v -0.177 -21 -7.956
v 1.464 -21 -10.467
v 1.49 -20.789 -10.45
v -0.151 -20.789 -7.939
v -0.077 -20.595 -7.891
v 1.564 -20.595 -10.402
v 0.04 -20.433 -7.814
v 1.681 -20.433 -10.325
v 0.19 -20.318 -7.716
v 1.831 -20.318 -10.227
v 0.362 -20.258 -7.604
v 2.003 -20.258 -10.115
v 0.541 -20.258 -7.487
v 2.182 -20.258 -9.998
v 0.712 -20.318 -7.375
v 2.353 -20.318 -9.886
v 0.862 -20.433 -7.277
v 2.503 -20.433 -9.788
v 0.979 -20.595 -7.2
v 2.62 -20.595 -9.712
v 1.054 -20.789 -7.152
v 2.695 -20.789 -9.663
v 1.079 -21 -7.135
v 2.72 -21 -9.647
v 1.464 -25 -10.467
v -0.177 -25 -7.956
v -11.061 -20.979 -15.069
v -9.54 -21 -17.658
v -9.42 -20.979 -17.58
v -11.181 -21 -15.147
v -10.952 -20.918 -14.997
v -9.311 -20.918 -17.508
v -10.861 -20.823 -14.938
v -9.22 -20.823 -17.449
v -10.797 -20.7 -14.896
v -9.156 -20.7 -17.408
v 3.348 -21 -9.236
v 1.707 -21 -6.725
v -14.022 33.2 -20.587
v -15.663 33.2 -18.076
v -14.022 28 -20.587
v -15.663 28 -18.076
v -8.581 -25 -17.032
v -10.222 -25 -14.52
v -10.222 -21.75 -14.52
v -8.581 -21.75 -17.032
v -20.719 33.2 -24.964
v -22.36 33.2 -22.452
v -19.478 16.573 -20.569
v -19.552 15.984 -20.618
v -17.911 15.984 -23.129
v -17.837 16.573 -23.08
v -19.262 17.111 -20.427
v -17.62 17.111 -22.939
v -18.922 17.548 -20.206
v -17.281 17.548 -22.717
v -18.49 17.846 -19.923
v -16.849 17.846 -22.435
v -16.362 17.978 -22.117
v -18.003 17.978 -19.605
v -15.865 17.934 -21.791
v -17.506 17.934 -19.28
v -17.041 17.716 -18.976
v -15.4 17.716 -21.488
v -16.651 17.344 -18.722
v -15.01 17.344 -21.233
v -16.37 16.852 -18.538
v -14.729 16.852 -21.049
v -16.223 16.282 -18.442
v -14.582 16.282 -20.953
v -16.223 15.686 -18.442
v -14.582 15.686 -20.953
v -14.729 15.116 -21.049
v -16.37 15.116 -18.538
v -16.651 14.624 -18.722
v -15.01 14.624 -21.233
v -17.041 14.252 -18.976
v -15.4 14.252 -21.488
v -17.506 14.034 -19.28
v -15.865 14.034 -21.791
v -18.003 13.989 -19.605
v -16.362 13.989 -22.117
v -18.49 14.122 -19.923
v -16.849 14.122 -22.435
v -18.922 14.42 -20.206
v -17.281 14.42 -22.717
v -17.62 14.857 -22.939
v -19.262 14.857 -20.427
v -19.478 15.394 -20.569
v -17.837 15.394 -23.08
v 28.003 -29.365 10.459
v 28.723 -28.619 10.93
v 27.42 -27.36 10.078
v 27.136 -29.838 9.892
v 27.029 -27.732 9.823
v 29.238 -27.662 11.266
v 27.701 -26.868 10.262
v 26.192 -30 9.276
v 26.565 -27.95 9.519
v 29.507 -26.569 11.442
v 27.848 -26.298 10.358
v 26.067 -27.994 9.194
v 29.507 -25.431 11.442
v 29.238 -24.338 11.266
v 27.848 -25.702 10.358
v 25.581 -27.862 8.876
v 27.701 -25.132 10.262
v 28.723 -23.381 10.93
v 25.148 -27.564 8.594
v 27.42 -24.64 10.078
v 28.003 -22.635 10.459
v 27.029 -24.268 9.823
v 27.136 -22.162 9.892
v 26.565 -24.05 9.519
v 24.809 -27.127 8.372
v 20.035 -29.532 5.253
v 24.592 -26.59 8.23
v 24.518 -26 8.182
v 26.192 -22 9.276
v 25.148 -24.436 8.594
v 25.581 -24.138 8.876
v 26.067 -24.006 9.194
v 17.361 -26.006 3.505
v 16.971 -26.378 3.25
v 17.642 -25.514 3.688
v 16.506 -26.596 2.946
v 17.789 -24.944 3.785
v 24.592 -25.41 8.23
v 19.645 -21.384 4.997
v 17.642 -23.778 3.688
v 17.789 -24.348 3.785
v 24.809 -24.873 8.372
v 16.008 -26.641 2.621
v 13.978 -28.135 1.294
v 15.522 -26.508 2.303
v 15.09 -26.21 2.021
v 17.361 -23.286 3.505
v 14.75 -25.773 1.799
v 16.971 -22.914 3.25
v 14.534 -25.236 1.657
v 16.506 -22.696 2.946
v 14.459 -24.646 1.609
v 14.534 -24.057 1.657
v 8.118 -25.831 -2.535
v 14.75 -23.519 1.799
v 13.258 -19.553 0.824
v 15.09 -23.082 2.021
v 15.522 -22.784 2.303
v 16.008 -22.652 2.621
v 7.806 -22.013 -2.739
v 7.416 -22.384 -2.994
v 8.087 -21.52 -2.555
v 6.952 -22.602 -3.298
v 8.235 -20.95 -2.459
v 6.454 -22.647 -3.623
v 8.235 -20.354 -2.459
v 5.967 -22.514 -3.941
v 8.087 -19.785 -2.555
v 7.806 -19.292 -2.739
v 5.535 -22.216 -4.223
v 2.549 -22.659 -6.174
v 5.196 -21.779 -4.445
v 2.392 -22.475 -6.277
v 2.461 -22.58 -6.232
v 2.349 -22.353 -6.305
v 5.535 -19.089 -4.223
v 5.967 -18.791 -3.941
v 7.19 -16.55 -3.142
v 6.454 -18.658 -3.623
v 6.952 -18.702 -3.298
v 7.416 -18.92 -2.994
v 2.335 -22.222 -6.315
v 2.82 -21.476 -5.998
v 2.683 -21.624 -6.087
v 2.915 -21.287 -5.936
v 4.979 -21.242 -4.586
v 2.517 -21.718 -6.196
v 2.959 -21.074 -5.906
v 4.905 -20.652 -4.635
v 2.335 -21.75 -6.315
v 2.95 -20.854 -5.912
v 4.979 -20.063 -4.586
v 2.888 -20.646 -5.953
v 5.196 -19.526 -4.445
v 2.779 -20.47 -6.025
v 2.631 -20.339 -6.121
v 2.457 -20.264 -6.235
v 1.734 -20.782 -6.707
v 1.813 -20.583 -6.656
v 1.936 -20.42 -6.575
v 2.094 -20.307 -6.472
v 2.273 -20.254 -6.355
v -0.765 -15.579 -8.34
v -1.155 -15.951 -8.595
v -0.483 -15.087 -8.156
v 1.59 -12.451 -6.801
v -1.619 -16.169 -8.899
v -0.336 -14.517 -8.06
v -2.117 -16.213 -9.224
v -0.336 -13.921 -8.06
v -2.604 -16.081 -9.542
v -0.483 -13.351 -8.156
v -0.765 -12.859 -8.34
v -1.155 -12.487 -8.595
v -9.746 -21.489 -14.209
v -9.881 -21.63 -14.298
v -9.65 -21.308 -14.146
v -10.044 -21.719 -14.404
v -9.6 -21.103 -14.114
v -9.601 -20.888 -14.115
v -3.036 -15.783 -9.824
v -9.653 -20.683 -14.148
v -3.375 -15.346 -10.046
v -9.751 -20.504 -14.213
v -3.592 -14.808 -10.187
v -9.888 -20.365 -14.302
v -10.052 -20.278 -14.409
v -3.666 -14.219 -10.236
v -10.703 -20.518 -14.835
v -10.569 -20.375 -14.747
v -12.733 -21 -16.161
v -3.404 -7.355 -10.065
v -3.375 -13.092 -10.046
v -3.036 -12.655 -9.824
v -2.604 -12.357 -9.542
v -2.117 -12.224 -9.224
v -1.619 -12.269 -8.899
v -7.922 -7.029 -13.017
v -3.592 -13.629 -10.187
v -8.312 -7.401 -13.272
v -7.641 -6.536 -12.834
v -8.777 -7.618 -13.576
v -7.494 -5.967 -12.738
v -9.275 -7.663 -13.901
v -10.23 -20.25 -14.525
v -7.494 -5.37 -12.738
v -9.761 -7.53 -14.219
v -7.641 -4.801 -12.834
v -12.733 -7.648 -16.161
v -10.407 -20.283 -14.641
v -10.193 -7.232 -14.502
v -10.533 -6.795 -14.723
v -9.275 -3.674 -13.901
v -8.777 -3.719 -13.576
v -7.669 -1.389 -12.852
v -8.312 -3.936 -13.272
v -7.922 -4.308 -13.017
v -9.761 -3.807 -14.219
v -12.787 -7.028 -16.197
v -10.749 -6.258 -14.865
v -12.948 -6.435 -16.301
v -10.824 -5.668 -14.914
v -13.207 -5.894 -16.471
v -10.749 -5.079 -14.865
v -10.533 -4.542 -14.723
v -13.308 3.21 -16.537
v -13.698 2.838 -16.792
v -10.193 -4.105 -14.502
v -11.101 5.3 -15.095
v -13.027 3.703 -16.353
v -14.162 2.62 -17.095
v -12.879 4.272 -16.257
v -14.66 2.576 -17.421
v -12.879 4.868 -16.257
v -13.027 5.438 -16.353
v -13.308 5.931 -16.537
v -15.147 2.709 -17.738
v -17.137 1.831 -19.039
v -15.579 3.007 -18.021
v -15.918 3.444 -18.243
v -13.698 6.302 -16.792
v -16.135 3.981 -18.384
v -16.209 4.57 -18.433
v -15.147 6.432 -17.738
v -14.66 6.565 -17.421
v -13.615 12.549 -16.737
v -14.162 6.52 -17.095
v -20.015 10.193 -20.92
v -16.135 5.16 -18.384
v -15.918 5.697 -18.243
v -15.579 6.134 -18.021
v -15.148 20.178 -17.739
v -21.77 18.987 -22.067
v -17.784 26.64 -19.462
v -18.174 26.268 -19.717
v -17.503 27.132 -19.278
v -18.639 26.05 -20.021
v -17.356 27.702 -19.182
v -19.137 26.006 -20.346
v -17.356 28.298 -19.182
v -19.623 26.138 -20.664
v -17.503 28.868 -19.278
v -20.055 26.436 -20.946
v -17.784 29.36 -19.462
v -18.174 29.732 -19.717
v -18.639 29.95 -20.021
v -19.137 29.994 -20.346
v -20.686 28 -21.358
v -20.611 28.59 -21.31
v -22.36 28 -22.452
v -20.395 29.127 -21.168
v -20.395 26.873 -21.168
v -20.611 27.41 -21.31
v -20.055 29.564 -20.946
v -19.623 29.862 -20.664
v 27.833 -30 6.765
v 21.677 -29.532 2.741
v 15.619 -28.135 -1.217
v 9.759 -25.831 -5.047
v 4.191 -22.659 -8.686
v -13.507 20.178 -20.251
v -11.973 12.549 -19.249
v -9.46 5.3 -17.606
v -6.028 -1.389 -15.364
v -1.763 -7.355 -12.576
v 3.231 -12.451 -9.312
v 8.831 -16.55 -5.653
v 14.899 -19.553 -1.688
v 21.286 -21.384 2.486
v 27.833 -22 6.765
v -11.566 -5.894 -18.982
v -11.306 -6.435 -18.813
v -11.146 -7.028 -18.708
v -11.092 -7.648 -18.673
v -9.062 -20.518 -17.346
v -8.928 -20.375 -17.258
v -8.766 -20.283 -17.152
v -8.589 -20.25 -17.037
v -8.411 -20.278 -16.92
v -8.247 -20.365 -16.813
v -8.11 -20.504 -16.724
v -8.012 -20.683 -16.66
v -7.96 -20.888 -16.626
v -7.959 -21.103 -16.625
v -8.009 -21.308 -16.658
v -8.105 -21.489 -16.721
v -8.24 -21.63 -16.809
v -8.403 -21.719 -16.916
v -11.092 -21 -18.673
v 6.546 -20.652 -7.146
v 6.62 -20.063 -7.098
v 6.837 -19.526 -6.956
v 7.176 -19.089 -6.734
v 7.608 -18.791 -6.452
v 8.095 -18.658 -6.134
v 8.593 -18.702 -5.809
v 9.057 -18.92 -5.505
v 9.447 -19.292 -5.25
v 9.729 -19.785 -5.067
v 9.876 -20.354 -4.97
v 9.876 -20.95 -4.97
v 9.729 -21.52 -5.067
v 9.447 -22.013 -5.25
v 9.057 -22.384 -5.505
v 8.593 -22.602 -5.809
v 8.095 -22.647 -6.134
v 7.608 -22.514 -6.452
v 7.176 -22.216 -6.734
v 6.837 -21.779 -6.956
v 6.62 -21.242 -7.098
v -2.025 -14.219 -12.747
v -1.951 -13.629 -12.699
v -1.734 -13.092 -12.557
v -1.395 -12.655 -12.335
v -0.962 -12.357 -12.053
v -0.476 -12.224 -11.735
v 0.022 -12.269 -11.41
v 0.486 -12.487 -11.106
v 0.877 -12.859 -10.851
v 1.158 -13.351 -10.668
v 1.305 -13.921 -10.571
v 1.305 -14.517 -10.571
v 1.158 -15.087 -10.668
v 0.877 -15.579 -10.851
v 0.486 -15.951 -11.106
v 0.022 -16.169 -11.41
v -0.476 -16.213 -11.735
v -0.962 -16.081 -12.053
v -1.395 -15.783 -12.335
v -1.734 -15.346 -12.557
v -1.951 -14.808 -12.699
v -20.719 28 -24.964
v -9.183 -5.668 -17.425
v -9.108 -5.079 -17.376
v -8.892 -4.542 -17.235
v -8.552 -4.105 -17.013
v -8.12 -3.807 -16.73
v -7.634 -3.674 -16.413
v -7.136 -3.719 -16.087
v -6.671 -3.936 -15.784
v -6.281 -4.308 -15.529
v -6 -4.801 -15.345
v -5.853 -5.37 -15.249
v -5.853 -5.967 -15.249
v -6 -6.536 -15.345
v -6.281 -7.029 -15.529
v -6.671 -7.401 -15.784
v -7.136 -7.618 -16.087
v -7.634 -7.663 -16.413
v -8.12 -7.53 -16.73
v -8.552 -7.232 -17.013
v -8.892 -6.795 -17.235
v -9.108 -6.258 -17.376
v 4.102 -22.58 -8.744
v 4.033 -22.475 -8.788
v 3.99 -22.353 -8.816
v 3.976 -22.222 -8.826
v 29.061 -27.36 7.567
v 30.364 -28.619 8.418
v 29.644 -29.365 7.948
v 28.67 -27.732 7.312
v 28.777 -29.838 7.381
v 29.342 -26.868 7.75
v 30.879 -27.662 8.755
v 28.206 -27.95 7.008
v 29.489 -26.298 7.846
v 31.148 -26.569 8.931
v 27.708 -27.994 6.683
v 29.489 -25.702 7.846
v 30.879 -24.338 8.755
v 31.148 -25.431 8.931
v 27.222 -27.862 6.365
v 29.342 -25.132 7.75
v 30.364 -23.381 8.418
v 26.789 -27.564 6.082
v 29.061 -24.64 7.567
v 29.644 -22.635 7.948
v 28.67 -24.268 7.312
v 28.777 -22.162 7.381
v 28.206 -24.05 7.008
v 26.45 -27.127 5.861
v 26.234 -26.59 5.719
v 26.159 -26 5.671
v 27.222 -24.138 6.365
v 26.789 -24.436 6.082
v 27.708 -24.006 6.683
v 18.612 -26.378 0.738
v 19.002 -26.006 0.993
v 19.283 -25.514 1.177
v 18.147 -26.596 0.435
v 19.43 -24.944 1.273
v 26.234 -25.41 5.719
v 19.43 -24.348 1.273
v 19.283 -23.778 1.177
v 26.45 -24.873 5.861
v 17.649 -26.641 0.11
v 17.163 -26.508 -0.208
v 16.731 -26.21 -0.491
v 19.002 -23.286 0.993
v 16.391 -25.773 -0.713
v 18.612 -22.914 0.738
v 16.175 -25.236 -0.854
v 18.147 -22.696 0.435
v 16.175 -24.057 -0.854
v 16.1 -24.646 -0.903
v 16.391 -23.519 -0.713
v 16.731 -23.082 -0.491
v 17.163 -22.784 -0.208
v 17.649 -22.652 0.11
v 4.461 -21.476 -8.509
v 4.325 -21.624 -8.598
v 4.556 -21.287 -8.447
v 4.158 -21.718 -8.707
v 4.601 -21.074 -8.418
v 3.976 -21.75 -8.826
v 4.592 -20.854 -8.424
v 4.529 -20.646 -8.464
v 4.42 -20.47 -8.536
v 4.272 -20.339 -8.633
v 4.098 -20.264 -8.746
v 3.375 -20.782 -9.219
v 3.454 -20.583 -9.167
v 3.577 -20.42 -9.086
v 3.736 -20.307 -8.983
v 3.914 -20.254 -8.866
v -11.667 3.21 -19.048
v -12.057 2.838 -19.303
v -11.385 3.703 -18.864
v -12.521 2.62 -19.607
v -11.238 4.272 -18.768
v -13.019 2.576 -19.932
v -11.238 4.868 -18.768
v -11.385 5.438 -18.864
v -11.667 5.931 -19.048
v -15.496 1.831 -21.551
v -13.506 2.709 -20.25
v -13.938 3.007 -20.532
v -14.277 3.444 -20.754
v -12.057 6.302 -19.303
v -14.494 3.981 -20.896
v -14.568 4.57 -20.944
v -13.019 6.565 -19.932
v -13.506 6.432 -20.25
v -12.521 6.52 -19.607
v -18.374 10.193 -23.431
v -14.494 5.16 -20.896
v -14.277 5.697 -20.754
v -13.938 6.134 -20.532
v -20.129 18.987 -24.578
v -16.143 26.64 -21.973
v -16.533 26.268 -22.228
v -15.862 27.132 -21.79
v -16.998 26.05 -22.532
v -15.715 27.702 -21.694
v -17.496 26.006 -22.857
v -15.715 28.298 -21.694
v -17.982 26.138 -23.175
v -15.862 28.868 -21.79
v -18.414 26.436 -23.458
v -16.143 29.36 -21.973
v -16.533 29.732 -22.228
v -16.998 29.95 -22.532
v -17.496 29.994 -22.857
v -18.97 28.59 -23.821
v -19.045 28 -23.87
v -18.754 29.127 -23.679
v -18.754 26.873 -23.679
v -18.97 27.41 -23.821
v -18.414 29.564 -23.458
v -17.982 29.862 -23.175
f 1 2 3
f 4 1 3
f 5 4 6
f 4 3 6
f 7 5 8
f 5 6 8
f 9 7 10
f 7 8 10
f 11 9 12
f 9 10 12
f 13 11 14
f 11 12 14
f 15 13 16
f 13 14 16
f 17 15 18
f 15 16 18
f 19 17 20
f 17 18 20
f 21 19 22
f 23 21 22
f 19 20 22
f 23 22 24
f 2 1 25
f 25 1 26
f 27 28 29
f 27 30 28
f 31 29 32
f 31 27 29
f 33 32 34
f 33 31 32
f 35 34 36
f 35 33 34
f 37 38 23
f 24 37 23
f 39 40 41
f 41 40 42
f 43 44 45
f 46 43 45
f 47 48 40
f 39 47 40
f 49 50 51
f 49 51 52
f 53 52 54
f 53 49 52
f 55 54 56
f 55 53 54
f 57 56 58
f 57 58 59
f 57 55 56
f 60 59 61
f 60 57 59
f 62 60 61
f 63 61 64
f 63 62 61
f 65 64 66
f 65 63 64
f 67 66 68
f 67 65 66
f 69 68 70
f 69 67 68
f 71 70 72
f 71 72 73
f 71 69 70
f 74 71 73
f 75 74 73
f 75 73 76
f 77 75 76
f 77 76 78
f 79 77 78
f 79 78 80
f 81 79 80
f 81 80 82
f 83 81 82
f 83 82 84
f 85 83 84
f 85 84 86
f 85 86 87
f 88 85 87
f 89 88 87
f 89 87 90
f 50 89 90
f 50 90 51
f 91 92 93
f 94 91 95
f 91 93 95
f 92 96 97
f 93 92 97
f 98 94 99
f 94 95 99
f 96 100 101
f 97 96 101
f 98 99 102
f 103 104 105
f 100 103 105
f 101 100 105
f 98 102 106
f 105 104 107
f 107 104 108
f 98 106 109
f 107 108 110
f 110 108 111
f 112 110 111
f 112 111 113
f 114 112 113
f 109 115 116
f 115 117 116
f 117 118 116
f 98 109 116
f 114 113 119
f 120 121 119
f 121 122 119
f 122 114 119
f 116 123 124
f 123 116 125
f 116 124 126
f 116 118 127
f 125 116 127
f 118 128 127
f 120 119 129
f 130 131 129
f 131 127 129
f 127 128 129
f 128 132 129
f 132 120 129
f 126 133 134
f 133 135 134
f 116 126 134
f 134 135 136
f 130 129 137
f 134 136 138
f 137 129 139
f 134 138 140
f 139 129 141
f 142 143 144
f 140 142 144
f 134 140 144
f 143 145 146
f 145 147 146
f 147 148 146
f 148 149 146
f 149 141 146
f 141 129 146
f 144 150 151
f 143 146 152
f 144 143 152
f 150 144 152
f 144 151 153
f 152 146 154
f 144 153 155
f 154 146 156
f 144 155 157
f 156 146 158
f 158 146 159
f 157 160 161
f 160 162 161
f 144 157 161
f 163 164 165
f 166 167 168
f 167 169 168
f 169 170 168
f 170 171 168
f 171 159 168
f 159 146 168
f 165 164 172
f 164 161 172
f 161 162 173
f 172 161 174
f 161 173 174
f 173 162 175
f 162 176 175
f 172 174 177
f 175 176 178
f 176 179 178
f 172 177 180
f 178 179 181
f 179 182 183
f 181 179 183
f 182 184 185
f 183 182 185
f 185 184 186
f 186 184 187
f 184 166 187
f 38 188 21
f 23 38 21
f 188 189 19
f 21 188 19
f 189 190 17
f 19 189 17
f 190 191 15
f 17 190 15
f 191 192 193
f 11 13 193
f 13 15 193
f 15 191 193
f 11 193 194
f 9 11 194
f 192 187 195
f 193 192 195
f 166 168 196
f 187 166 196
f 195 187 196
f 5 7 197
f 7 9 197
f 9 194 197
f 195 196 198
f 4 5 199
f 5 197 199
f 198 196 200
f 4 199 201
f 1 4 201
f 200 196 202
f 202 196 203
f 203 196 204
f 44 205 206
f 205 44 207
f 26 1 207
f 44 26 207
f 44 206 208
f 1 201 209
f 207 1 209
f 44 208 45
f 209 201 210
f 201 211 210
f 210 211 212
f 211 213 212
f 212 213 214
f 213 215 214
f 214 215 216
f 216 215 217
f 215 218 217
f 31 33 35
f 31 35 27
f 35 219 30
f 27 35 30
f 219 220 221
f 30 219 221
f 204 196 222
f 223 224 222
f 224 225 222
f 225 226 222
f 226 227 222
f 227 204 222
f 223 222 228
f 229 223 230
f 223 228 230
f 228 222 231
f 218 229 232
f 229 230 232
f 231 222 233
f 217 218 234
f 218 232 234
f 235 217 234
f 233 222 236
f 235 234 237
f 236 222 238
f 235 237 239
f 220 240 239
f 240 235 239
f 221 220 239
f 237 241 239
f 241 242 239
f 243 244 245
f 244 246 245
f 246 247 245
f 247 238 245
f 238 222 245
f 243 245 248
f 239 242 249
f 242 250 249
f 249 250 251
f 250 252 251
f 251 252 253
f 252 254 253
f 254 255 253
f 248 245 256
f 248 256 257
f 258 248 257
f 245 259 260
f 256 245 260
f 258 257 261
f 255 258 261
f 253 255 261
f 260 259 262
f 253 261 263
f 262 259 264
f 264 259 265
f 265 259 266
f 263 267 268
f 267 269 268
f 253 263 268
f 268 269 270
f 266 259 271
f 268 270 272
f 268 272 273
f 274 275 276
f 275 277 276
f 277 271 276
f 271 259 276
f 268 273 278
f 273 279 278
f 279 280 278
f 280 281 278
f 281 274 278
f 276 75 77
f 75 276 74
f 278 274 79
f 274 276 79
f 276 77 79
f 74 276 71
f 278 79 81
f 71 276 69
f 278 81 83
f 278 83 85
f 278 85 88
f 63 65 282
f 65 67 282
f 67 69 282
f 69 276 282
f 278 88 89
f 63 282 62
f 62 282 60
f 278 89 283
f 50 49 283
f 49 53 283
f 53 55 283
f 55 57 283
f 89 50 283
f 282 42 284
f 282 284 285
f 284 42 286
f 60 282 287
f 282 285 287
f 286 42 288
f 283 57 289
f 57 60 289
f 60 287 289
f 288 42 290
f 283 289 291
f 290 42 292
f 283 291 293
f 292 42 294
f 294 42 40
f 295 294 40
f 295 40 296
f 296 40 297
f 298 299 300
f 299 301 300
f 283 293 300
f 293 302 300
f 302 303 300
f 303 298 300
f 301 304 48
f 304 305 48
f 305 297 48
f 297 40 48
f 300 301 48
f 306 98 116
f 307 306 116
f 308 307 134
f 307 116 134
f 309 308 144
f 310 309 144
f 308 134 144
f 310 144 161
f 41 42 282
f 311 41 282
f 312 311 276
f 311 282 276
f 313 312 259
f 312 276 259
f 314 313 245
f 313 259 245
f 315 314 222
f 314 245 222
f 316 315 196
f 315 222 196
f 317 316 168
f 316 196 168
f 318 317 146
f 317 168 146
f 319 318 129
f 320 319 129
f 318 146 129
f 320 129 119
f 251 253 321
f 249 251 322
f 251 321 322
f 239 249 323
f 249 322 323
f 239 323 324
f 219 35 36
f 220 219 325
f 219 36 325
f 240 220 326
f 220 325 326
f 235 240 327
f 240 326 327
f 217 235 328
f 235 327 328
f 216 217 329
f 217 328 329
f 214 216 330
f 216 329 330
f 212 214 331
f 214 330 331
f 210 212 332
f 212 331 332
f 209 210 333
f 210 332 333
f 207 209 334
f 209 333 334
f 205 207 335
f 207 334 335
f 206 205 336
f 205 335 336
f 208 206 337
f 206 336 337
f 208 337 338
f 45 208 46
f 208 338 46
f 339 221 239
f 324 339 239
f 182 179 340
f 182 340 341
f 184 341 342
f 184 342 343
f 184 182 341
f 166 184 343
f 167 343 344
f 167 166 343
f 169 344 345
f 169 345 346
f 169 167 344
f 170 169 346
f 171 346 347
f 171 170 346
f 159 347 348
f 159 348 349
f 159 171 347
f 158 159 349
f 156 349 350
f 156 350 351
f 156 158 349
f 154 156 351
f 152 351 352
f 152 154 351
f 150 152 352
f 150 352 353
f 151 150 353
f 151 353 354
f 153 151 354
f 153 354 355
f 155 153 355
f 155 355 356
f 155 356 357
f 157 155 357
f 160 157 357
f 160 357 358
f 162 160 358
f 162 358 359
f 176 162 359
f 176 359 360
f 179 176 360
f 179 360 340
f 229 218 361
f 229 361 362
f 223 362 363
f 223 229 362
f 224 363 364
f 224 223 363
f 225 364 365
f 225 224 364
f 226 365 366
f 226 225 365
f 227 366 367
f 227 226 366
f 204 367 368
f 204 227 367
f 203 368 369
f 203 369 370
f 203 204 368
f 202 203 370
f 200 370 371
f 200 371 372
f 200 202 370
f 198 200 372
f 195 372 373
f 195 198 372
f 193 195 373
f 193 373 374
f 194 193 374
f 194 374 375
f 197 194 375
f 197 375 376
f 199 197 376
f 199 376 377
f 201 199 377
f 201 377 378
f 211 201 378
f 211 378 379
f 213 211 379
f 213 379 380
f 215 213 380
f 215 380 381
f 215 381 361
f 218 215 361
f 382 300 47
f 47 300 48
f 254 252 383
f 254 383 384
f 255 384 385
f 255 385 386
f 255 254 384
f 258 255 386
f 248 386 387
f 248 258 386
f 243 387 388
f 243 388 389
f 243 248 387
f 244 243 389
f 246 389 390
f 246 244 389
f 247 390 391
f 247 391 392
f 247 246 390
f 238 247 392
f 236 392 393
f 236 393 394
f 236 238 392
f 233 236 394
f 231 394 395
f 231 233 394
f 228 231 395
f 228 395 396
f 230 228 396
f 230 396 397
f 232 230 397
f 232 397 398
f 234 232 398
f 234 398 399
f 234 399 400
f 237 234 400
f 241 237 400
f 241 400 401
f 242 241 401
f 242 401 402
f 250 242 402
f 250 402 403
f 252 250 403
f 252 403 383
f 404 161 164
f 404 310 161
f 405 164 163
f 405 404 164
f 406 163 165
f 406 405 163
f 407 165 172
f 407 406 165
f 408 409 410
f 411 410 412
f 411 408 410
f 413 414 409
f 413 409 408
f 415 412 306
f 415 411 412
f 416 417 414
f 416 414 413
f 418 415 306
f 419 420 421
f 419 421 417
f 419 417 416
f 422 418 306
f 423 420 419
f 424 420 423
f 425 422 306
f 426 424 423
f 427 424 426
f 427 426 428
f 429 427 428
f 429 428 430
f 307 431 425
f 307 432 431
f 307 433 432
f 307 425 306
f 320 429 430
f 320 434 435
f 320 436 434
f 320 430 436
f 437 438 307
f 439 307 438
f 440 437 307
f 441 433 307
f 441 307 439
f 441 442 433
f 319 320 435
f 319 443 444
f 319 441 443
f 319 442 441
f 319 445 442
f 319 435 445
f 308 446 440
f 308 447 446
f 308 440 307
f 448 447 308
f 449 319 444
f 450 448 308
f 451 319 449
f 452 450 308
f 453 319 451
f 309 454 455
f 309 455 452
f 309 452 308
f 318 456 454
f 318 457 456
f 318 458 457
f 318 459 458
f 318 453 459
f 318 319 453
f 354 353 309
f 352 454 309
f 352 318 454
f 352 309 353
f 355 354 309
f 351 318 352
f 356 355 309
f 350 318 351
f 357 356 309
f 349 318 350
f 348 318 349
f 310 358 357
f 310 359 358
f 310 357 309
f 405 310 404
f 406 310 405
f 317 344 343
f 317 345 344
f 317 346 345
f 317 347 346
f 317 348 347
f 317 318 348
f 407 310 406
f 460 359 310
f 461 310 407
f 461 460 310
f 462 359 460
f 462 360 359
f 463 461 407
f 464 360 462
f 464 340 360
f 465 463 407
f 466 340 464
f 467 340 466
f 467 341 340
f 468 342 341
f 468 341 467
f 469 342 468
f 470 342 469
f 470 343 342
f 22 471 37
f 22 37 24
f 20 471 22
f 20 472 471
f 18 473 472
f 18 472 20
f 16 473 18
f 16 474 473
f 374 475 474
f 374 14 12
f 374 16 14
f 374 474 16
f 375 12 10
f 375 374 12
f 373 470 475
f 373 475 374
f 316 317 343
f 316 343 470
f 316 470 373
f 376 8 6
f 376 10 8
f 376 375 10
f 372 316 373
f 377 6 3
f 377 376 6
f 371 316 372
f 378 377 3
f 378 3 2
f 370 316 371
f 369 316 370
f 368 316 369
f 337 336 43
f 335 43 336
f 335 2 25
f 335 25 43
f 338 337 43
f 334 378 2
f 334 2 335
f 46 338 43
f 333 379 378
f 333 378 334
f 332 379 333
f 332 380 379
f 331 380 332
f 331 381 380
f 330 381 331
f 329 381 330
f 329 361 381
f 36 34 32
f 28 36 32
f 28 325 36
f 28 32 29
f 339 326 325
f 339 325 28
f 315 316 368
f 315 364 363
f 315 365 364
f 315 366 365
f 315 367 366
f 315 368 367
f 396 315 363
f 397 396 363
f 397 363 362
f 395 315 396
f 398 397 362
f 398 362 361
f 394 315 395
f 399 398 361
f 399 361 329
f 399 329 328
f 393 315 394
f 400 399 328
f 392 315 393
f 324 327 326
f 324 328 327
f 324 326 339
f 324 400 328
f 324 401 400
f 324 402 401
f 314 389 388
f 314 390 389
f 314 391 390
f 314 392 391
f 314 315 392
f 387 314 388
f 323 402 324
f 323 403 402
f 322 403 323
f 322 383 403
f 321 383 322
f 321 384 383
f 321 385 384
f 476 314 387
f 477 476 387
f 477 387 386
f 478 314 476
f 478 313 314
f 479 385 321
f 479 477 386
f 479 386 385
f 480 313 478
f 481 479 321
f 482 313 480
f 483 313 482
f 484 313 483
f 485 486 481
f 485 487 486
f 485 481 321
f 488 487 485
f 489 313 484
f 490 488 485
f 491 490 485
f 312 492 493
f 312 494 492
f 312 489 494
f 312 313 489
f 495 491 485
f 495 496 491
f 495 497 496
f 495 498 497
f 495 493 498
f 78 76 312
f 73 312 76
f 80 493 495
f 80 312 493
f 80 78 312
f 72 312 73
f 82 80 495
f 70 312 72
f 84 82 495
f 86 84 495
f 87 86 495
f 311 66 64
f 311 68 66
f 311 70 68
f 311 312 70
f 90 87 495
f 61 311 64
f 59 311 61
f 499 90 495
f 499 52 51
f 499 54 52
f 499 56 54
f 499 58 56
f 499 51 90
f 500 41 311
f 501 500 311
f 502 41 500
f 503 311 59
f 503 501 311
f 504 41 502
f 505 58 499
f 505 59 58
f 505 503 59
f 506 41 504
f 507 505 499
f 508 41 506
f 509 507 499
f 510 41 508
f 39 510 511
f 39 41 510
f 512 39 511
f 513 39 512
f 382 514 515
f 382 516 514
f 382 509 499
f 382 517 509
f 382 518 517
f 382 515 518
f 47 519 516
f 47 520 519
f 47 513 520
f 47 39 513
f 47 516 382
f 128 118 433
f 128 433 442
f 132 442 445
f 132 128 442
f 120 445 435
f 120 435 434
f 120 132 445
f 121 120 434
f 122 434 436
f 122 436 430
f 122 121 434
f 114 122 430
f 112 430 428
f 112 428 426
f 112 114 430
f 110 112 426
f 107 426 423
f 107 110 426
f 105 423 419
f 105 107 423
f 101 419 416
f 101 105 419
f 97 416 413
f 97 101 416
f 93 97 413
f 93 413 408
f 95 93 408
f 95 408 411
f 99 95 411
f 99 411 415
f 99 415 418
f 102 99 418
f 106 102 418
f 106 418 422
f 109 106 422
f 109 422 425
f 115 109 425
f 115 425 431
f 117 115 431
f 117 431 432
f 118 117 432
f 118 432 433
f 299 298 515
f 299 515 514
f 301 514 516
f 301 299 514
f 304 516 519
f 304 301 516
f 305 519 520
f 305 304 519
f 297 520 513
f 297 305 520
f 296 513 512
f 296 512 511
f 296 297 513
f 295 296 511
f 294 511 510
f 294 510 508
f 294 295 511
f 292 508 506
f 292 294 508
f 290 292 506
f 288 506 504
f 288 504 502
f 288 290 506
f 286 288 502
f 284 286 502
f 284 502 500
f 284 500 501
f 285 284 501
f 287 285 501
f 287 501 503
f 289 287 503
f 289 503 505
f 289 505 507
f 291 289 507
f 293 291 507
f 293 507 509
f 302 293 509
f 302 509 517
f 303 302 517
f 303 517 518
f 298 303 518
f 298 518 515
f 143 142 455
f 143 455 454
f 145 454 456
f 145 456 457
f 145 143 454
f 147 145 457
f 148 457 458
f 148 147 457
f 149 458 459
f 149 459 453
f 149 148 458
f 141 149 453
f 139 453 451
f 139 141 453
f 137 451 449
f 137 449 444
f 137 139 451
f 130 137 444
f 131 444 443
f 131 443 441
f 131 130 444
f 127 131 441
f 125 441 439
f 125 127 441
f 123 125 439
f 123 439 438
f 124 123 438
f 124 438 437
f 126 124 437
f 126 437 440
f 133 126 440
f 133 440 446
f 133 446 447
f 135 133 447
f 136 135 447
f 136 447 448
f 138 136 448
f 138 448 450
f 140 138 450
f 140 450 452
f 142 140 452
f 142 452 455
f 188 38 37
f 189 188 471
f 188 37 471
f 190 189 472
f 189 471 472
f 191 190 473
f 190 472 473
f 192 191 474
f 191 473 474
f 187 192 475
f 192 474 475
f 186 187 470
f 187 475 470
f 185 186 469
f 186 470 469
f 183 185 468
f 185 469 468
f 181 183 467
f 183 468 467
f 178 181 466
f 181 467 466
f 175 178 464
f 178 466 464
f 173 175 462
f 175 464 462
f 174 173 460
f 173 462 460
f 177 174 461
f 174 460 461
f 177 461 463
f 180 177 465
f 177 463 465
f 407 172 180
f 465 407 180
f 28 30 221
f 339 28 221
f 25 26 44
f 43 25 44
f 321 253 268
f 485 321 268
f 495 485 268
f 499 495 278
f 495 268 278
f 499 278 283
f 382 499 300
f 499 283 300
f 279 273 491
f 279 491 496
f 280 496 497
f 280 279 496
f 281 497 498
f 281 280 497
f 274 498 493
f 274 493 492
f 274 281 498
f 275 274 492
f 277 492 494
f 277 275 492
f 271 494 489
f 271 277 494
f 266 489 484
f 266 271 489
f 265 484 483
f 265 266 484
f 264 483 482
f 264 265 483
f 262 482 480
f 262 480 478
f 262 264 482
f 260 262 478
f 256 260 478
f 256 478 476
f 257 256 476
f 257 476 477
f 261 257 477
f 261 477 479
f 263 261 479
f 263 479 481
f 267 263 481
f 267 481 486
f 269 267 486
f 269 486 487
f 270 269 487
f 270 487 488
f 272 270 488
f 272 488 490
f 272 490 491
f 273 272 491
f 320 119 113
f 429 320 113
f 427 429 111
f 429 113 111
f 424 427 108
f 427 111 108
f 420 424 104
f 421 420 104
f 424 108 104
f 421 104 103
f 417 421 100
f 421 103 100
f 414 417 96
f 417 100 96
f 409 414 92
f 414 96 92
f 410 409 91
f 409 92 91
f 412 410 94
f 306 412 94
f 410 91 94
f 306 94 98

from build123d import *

# Parameters (mm, degrees)
EXTRUDE_1_OUTLINE_R = 2
EXTRUDE_1_DEPTH     = 5.1
SKETCH_4_2_R        = 2
CUT_EXTRUDE_1_DEPTH = 2.1
SKETCH_5_R          = 0.75
CUT_EXTRUDE_2_DEPTH = 48.355992497
FILLET_1_R          = 0.5
FILLET_2_R          = 3


with BuildPart() as part:
    # 凸台-拉伸1: read off the stored shape, not the designer's step
    # 凸台-拉伸1 outline → 凸台-拉伸1 (new body)
    with BuildSketch(Plane(origin=(15.11890087, 0, 4.548317805), x_dir=(-0.8371072123201975, 0, -0.5470388606685158), z_dir=(0.5470388606685158, 0, -0.8371072123201975))):
        with BuildLine():
            ThreePointArc((-11.855752449, -22), (-15.855752449, -26), (-11.855752449, -30))
            ThreePointArc((-11.855752449, -30), (2.877521805, -28.097510014), (16.644247551, -22.514849302))
            Line((16.644247551, -22.514849302), (16.644247551, -21))
            Line((16.644247551, -21), (19.644247551, -21))
            Line((19.644247551, -21), (19.644247551, -25))
            Line((19.644247551, -25), (31.644247551, -25))
            Line((31.644247551, -25), (31.644247551, -21))
            Line((31.644247551, -21), (34.644247551, -21))
            Line((34.644247551, -21), (34.644247551, -6.666266023))
            ThreePointArc((34.644247551, -6.666266023), (43.194224844, 9.738017632), (46.144247551, 28))
            Line((46.144247551, 28), (46.144247551, 33.2))
            Line((46.144247551, 33.2), (38.144247551, 33.2))
            Line((38.144247551, 33.2), (38.144247551, 28))
            ThreePointArc((38.144247551, 28), (23.49958661, -7.355339059), (-11.855752449, -22))
        make_face()
        with Locations((-11.855752449, -26)):
            Circle(EXTRUDE_1_OUTLINE_R, mode=Mode.SUBTRACT)
        with Locations((0.160377984, -24.646107258)):
            Circle(EXTRUDE_1_OUTLINE_R, mode=Mode.SUBTRACT)
        with Locations((11.573969463, -20.652318867)):
            Circle(EXTRUDE_1_OUTLINE_R, mode=Mode.SUBTRACT)
        with Locations((21.812696851, -14.218900053)):
            Circle(EXTRUDE_1_OUTLINE_R, mode=Mode.SUBTRACT)
        with Locations((30.363147604, -5.6684493)):
            Circle(EXTRUDE_1_OUTLINE_R, mode=Mode.SUBTRACT)
        with Locations((36.796566418, 4.570278088)):
            Circle(EXTRUDE_1_OUTLINE_R, mode=Mode.SUBTRACT)
        with Locations((40.790354809, 15.983869566)):
            Circle(EXTRUDE_1_OUTLINE_R, mode=Mode.SUBTRACT)
        with Locations((42.144247551, 28)):
            Circle(EXTRUDE_1_OUTLINE_R, mode=Mode.SUBTRACT)
    extrude(amount=EXTRUDE_1_DEPTH)

    # 草图4<2> → 切除-拉伸1 (cut)
    with BuildSketch(Plane(origin=(15.11890087, 0, 4.548317805), x_dir=(-0.8371072123201975, 0, -0.5470388606685158), z_dir=(0.5470388606685158, 0, -0.8371072123201975))):
        with BuildLine():
            Line((19.644247551, -21), (19.644247551, -25))
            Line((19.644247551, -25), (31.644247551, -25))
            Line((31.644247551, -25), (31.644247551, -21))
            Line((31.644247551, -21), (34.644247551, -21))
            Line((34.644247551, -21), (34.644247551, -6.666266023))
            ThreePointArc((34.644247551, -6.666266023), (43.194224844, 9.738017632), (46.144247551, 28))
            Line((46.144247551, 28), (46.144247551, 33.2))
            Line((46.144247551, 33.2), (38.144247551, 33.2))
            Line((38.144247551, 33.2), (38.144247551, 28))
            ThreePointArc((38.144247551, 28), (23.49958661, -7.355339059), (-11.855752449, -22))
            ThreePointArc((-11.855752449, -22), (-15.855752449, -26), (-11.855752449, -30))
            ThreePointArc((-11.855752449, -30), (2.877521805, -28.097510014), (16.644247551, -22.514849302))
            Line((16.644247551, -22.514849302), (16.644247551, -21))
            Line((16.644247551, -21), (19.644247551, -21))
        make_face()
        with Locations((42.144247551, 28)):
            Circle(SKETCH_4_2_R, mode=Mode.SUBTRACT)
        with Locations((40.790354809, 15.983869566)):
            Circle(SKETCH_4_2_R, mode=Mode.SUBTRACT)
        with Locations((36.796566418, 4.570278088)):
            Circle(SKETCH_4_2_R, mode=Mode.SUBTRACT)
        with Locations((30.363147604, -5.6684493)):
            Circle(SKETCH_4_2_R, mode=Mode.SUBTRACT)
        with Locations((21.812696851, -14.218900053)):
            Circle(SKETCH_4_2_R, mode=Mode.SUBTRACT)
        with Locations((11.573969463, -20.652318867)):
            Circle(SKETCH_4_2_R, mode=Mode.SUBTRACT)
        with Locations((0.160377984, -24.646107258)):
            Circle(SKETCH_4_2_R, mode=Mode.SUBTRACT)
        with Locations((-11.855752449, -26)):
            Circle(SKETCH_4_2_R, mode=Mode.SUBTRACT)
    extrude(amount=CUT_EXTRUDE_1_DEPTH, mode=Mode.SUBTRACT)

    # 草图5 → 切除-拉伸2 (cut, through all)
    with BuildSketch(Plane(origin=(5.23144021, 0, -8.005420904), x_dir=(-0.8371072123201976, 0, -0.5470388606685158), z_dir=(0.5470388606685158, 0, -0.8371072123201976))):
        with Locations((3.75, -21)):
            Circle(SKETCH_5_R)
        with Locations((16.5, -21)):
            Circle(SKETCH_5_R)
        with Locations((1.5, -21)):
            Circle(SKETCH_5_R)
    extrude(amount=-CUT_EXTRUDE_2_DEPTH, mode=Mode.SUBTRACT)

    # 圆角1
    fillet_1_edges = [part.edges().sort_by_distance(p)[0] for p in [
        (-10.029217494, -21, -16.186180432),
        (3.1552211, -22.514849302, -7.570318376),
    ]]
    fillet(fillet_1_edges, radius=FILLET_1_R)

    # 圆角2
    fillet_2_edges = [part.edges().sort_by_distance(p)[0] for p in [
        (-11.912708722, -6.666266023, -17.417017868),
    ]]
    fillet(fillet_2_edges, radius=FILLET_2_R)


solid = part.part
